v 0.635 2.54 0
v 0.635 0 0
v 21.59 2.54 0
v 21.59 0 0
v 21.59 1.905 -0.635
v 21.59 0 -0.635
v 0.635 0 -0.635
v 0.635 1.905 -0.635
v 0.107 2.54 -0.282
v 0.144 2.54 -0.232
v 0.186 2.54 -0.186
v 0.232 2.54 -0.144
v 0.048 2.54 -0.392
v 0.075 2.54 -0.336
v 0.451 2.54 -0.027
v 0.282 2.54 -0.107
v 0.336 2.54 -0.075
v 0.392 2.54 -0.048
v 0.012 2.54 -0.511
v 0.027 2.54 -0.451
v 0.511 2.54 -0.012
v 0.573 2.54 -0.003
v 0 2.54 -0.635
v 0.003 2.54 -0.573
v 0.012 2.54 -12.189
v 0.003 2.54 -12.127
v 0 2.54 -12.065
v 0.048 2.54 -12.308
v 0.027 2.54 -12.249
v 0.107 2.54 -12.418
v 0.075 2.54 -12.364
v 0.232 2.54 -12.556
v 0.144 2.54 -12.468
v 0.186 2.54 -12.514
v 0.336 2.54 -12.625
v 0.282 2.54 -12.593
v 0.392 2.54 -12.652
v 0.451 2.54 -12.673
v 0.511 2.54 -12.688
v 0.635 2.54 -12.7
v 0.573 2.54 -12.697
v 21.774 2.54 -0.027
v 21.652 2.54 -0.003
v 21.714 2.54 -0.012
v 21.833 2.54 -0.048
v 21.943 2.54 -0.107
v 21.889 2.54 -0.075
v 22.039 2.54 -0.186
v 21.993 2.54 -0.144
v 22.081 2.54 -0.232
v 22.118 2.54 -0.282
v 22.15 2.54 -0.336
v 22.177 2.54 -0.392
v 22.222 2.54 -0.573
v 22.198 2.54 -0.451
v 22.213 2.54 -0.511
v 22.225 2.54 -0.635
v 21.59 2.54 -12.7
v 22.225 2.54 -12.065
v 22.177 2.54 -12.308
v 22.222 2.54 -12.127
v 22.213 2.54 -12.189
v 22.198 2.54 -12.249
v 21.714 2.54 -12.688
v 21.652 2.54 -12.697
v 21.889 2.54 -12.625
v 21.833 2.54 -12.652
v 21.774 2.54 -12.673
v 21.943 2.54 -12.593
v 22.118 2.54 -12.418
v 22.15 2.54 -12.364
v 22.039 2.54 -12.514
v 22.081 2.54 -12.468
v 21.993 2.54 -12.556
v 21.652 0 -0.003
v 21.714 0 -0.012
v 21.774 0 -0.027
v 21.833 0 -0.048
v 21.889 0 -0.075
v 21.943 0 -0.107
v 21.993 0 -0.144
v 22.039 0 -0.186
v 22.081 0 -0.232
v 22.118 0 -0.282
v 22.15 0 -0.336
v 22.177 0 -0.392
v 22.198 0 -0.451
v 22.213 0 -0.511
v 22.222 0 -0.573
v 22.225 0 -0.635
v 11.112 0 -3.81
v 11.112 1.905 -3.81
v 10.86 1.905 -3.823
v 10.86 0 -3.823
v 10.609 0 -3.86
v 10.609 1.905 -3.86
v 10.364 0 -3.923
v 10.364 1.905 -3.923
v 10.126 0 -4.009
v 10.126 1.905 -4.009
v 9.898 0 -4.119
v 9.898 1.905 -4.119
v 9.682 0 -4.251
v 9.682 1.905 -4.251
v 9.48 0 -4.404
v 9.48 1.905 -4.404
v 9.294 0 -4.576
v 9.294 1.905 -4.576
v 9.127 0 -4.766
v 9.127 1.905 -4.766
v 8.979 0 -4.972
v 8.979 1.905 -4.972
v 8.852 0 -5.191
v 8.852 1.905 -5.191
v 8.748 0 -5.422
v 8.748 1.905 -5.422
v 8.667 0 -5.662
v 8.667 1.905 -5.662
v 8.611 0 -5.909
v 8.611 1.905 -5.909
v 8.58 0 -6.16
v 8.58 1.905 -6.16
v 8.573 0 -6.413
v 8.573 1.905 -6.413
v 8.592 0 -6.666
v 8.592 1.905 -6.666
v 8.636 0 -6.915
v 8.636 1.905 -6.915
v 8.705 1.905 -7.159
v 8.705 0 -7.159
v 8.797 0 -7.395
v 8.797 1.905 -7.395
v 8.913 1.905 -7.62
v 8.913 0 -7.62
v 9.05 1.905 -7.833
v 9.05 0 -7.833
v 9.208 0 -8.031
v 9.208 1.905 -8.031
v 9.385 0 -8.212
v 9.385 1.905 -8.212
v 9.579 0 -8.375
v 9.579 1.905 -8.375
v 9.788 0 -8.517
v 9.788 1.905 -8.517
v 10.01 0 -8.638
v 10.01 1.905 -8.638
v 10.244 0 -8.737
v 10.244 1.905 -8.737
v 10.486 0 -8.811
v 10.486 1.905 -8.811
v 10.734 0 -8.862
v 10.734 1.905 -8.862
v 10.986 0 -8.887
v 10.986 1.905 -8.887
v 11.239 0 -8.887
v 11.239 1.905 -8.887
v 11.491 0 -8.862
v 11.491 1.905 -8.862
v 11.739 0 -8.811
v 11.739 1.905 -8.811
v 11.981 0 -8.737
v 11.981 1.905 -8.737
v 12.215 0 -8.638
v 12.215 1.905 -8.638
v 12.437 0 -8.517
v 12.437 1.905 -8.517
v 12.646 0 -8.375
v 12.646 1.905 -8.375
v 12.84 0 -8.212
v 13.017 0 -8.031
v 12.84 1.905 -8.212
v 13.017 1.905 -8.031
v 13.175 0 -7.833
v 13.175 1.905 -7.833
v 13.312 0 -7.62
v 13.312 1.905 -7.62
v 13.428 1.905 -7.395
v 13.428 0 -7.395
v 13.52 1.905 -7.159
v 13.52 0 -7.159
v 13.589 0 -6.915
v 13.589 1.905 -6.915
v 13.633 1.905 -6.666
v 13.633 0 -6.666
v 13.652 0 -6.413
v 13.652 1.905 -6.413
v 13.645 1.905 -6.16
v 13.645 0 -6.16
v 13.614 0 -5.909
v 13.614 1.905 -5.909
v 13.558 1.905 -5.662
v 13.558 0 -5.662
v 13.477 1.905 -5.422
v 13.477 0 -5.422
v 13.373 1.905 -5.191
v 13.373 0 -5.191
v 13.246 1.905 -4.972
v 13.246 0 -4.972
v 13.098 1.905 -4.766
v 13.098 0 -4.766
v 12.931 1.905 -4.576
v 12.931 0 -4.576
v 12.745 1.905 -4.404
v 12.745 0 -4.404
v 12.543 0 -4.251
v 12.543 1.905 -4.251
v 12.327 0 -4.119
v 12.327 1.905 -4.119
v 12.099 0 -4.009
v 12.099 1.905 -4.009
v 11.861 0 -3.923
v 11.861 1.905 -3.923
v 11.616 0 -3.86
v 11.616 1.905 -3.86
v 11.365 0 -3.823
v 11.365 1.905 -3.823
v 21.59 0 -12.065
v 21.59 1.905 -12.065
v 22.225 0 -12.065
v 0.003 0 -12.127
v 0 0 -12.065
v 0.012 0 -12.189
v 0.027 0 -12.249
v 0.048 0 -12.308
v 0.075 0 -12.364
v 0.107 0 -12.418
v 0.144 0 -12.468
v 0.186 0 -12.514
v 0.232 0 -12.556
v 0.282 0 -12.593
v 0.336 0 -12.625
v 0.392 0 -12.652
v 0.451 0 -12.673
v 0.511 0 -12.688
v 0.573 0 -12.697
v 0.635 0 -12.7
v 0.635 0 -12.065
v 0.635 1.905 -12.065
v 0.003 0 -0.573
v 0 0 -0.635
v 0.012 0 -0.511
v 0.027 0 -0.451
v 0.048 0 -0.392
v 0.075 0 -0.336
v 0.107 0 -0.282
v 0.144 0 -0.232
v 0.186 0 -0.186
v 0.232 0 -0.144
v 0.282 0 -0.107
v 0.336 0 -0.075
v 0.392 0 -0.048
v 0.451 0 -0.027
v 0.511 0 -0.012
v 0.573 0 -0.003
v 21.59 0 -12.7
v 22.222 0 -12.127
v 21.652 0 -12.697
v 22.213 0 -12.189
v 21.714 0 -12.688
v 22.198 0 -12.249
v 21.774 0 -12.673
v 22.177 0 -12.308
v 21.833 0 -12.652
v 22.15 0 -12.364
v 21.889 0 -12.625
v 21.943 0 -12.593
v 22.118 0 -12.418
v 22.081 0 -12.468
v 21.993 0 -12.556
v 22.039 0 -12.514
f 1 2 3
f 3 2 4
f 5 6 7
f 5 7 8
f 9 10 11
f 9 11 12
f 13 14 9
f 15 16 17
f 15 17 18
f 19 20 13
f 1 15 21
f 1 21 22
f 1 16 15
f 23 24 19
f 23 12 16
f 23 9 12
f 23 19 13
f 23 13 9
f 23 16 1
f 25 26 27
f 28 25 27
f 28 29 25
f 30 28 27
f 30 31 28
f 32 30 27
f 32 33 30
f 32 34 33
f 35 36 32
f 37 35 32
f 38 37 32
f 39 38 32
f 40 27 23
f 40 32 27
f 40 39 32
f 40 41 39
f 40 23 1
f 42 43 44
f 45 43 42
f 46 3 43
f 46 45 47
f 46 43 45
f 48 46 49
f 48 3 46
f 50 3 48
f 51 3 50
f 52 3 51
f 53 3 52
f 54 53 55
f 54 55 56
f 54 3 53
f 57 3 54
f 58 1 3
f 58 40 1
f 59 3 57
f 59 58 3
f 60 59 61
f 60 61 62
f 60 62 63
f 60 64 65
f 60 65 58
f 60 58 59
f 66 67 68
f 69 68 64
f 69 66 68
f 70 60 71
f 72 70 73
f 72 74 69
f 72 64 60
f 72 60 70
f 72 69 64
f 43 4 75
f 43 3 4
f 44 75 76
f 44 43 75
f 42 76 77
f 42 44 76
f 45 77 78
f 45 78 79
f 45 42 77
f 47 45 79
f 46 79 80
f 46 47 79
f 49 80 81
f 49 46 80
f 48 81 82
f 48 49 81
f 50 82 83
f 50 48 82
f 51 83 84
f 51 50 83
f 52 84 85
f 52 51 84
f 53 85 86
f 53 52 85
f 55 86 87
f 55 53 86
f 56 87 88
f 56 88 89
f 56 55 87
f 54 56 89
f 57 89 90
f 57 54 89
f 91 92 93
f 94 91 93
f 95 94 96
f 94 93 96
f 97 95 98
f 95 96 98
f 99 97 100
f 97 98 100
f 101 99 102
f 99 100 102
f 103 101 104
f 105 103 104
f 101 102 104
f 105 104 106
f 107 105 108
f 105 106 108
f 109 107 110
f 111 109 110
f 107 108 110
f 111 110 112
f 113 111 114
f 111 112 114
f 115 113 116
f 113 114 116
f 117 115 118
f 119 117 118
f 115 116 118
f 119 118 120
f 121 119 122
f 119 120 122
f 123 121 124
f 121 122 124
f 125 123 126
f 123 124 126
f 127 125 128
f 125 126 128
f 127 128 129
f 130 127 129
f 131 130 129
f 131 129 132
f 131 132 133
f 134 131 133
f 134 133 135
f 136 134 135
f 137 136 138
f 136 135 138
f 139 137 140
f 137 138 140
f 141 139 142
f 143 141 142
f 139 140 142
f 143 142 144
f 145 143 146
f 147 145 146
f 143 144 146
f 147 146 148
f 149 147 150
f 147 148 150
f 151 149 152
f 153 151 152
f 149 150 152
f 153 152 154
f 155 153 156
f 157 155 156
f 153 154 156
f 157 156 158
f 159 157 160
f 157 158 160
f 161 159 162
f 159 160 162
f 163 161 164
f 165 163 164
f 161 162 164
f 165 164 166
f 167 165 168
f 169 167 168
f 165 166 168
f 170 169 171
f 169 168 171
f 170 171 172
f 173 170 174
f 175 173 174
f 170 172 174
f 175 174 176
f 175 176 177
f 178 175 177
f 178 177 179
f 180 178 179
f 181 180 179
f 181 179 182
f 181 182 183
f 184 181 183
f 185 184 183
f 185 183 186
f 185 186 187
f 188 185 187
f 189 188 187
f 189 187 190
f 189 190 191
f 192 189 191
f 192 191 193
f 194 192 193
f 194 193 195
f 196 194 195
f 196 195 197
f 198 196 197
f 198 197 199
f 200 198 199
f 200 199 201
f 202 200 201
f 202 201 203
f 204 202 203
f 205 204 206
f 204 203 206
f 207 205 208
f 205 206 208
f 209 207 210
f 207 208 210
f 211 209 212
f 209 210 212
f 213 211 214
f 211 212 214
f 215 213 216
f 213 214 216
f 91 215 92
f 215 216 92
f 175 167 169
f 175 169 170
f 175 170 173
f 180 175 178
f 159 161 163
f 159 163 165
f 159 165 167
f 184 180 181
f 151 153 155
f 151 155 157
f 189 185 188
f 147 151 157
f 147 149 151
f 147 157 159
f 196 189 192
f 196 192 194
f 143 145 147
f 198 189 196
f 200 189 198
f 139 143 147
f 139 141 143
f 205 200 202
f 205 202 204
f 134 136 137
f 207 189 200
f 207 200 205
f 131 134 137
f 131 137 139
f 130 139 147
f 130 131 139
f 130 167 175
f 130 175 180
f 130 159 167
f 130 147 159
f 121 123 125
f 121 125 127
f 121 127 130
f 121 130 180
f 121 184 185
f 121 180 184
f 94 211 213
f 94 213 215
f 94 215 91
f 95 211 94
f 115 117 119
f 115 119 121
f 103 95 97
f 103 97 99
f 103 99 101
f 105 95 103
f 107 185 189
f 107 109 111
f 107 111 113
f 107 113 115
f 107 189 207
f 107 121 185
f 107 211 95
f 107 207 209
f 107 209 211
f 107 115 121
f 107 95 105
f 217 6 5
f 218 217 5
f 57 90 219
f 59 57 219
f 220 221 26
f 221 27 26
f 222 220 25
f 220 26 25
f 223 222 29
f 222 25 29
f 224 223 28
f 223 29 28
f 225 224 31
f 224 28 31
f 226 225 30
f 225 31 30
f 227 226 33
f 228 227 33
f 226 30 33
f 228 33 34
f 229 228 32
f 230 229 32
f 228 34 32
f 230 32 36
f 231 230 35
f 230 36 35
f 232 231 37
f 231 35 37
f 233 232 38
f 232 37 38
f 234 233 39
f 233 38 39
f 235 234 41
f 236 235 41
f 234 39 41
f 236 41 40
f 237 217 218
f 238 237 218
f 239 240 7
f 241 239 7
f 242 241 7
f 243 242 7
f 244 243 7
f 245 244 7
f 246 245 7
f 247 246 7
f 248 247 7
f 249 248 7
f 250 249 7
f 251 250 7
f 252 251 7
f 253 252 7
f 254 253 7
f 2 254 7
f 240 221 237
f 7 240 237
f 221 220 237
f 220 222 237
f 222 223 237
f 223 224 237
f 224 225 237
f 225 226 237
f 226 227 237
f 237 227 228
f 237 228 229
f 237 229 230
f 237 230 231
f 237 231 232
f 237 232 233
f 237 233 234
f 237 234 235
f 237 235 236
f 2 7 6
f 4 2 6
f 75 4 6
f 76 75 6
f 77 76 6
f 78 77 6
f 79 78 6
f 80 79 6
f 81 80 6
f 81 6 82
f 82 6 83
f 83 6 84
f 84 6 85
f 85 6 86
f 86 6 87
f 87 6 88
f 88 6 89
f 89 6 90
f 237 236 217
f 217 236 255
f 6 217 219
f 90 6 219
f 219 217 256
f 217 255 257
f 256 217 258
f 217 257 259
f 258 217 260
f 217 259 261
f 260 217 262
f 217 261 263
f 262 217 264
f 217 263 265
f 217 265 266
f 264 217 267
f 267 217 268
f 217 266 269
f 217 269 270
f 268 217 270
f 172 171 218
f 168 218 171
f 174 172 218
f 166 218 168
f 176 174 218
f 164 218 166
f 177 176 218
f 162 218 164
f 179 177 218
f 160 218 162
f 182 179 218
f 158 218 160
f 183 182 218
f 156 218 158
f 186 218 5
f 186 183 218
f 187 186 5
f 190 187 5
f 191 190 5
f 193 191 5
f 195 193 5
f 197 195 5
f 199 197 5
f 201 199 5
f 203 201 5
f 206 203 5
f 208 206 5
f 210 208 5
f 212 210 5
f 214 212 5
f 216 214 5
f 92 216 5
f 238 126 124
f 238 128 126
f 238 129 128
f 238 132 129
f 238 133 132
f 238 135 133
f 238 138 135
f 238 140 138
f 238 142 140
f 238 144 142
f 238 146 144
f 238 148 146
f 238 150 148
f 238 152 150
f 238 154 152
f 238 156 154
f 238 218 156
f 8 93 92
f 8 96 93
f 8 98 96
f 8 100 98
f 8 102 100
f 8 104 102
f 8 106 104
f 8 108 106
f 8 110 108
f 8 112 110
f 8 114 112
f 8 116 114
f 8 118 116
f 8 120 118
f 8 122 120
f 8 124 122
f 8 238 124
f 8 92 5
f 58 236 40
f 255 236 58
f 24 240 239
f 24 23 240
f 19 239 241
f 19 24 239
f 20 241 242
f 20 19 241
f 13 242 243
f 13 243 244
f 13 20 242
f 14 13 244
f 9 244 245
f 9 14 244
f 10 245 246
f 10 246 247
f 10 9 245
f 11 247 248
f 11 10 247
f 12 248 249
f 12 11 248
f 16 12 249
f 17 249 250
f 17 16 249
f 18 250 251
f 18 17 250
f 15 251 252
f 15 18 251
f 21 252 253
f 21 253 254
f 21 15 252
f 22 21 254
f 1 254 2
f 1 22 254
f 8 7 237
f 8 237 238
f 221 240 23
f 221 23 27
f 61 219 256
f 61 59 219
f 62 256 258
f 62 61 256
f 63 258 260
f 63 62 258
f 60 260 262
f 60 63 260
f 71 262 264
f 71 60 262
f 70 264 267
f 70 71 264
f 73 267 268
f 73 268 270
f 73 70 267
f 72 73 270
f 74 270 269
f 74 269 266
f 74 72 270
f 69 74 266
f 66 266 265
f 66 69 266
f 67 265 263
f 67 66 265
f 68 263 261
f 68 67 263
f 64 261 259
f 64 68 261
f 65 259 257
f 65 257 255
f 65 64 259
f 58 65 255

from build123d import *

# Parameters (mm, degrees)
SKETCH1_W           = 22.225
SKETCH1_H           = 12.7
BOSS_EXTRUDE1_DEPTH = 2.54
FILLET1_R           = 0.635
SHELL1_START        = 0.635
SHELL1_OUTLINE_W    = 1.905
SHELL1_OUTLINE_H    = 11.43
SHELL1_DEPTH        = 20.955
SKETCH2_R           = 2.54
BOSS_EXTRUDE2_DEPTH = 1.905


# Read off the part's stored shape, not the designer's step: Shell1
with BuildPart() as part:
    # Sketch1 → Boss-Extrude1 (new body)
    with BuildSketch(Plane(origin=(0, 0, 0), x_dir=(1, 0, 0), z_dir=(0, 1, 0))):
        with Locations((11.1125, 6.35)):
            Rectangle(SKETCH1_W, SKETCH1_H)
    extrude(amount=BOSS_EXTRUDE1_DEPTH)

    # Fillet1
    fillet1_edges = [part.edges().sort_by_distance(p)[0] for p in [
        (0, 1.27, -12.7),
        (22.225, 1.27, -12.7),
        (22.225, 1.27, 0),
        (0, 1.27, 0),
    ]]
    fillet(fillet1_edges, radius=FILLET1_R)

    # Shell1 outline → Shell1 (cut)
    with BuildSketch(Plane.YZ.offset(SHELL1_START)):
        with Locations((0.9525, -6.35)):
            Rectangle(SHELL1_OUTLINE_W, SHELL1_OUTLINE_H)
    extrude(amount=SHELL1_DEPTH, mode=Mode.SUBTRACT)

    # Sketch2 → Boss-Extrude2 (add)
    with BuildSketch(Plane(origin=(0, 1.905, 0), x_dir=(-1, 0, 0), z_dir=(0, -1, 0))):
        with Locations(Location((-11.1125, 6.35, 0), (0, 0, 270))):
            Circle(SKETCH2_R)
    extrude(amount=BOSS_EXTRUDE2_DEPTH)


solid = part.part
